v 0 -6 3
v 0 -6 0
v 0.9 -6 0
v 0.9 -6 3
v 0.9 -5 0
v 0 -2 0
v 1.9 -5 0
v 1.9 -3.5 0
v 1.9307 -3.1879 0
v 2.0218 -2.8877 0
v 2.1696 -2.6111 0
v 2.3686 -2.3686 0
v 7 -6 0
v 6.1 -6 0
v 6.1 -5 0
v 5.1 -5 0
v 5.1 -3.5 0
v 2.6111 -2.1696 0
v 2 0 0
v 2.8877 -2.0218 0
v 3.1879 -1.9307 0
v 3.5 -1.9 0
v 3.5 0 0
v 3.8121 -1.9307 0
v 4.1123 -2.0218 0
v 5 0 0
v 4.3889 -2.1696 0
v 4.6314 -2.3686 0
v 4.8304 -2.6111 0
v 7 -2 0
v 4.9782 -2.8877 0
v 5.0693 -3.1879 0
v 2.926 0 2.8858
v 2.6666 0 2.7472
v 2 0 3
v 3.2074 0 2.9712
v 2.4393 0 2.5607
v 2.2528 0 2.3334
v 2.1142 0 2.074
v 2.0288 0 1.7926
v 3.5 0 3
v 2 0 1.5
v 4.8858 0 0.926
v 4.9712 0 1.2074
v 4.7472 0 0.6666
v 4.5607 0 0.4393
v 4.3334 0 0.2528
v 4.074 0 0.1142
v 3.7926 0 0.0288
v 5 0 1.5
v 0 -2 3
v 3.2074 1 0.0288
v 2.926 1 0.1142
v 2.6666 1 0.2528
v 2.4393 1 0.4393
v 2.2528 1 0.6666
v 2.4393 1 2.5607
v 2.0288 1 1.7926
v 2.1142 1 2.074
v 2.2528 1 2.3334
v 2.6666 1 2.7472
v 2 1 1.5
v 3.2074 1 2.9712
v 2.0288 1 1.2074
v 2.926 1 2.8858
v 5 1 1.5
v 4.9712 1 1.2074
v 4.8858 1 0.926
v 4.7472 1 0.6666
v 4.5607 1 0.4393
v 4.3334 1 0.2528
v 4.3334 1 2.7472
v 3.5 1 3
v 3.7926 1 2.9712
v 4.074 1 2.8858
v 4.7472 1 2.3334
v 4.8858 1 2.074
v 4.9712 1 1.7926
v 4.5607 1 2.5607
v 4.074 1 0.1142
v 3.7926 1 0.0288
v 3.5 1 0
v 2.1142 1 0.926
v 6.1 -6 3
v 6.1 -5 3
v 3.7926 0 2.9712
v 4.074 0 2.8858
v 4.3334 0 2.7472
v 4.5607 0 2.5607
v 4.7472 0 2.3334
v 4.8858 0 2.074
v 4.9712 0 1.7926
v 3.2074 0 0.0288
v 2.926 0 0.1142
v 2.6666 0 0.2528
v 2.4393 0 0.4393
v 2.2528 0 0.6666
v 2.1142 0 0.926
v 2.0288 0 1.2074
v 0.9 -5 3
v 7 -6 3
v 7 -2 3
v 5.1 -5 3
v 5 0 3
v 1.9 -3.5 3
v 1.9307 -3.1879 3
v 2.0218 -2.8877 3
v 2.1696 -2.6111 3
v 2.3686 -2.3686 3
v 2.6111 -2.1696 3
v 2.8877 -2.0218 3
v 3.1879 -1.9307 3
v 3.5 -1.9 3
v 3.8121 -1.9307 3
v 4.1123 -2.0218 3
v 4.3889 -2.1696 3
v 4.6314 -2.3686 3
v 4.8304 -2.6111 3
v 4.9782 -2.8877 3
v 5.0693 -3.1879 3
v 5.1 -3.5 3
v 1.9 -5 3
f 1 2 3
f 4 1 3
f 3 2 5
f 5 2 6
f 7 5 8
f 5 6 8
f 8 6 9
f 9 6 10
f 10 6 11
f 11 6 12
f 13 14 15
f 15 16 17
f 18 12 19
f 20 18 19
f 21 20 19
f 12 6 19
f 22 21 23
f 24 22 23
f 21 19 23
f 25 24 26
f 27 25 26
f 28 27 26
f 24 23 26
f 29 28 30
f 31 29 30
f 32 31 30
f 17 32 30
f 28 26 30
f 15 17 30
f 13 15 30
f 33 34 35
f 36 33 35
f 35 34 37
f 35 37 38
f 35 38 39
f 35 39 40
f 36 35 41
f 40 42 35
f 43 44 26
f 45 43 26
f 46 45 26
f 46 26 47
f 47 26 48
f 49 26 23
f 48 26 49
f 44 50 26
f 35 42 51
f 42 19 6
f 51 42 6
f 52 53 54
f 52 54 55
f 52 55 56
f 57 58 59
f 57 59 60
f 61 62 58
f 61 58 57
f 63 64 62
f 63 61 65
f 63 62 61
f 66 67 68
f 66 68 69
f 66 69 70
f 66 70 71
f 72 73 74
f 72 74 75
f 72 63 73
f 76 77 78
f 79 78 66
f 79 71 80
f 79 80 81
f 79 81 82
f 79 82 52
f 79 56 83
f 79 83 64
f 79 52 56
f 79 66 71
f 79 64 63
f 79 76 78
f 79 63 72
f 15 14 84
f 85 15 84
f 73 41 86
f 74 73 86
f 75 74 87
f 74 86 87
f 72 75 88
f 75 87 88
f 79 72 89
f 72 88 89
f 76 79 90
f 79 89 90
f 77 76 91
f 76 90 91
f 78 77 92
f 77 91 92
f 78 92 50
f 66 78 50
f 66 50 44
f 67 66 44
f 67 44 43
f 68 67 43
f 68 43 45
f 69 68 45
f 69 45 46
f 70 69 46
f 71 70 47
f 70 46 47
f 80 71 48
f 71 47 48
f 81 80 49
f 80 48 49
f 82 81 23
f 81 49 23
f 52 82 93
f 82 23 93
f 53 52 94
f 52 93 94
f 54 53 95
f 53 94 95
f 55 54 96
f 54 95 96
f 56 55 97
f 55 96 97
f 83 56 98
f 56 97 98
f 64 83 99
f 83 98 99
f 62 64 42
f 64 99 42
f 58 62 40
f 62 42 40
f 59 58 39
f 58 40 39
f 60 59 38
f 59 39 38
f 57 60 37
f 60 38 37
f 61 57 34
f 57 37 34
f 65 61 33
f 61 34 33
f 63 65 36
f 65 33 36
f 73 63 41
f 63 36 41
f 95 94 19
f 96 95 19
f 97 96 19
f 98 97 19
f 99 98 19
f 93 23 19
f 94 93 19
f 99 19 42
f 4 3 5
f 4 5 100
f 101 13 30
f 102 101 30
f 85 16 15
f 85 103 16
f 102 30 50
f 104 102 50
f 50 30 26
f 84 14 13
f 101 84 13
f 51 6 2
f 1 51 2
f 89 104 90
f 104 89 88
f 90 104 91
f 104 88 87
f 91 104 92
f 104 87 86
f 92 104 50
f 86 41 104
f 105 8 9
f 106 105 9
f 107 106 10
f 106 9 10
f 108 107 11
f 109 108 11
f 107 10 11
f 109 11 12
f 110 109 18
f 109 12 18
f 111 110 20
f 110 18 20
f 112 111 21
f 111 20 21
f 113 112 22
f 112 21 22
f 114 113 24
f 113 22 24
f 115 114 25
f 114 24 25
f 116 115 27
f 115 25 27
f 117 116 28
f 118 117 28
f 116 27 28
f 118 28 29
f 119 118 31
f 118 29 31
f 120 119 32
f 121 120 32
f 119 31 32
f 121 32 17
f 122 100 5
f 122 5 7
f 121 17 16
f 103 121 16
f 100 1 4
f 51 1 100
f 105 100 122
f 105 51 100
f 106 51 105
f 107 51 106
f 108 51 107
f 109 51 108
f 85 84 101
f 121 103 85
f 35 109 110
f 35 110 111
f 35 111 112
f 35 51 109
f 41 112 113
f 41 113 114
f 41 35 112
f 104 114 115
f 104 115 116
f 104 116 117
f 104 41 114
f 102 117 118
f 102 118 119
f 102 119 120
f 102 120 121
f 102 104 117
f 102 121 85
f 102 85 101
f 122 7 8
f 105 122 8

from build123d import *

# Parameters (mm, degrees)
EXTRUDE_1_DEPTH     = 3
SKETCH_4_R          = 1.5
EXTRUDE_3_DEPTH     = 1
SKETCH_8_W          = 1.758290516
SKETCH_8_H          = 4.288229266
SKETCH_8_W_2        = 1.505617074
SKETCH_8_H_2        = 4.786356908
CUT_EXTRUDE_3_DEPTH = 1


with BuildPart() as part:
    # 草图2 → 凸台-拉伸1 (new body)
    with BuildSketch(Plane.XY):
        with BuildLine():
            Line((5, 0), (2, 0))
            Line((2, 0), (0, -2))
            Line((0, -2), (0, -6))
            Line((0, -6), (1.9, -6))
            Line((1.9, -6), (1.9, -3.5))
            ThreePointArc((1.9, -3.5), (3.5, -1.9), (5.1, -3.5))
            Line((5.1, -3.5), (5.1, -6))
            Line((5.1, -6), (7, -6))
            Line((7, -6), (7, -2))
            Line((7, -2), (5, 0))
        make_face()
    extrude(amount=EXTRUDE_1_DEPTH)

    # 草图4 → 凸台-拉伸3 (add)
    with BuildSketch(Plane(origin=(0, 0, 0), x_dir=(1, 0, 0), z_dir=(0, 1, 0))):
        with Locations(Location((3.5, -1.5, 0), (0, 0, 270))):  # turned: the seam where the file's is
            Circle(SKETCH_4_R)
    extrude(amount=EXTRUDE_3_DEPTH)

    # 草图8 → 切除-拉伸3 (cut)
    with BuildSketch(Plane.XZ.offset(6)):
        with Locations((1.779145258, 1.583021274)):
            Rectangle(SKETCH_8_W, SKETCH_8_H)
        with Locations((5.347191463, 1.528876965)):
            Rectangle(SKETCH_8_W_2, SKETCH_8_H_2)
    extrude(amount=-CUT_EXTRUDE_3_DEPTH, mode=Mode.SUBTRACT)


solid = part.part
